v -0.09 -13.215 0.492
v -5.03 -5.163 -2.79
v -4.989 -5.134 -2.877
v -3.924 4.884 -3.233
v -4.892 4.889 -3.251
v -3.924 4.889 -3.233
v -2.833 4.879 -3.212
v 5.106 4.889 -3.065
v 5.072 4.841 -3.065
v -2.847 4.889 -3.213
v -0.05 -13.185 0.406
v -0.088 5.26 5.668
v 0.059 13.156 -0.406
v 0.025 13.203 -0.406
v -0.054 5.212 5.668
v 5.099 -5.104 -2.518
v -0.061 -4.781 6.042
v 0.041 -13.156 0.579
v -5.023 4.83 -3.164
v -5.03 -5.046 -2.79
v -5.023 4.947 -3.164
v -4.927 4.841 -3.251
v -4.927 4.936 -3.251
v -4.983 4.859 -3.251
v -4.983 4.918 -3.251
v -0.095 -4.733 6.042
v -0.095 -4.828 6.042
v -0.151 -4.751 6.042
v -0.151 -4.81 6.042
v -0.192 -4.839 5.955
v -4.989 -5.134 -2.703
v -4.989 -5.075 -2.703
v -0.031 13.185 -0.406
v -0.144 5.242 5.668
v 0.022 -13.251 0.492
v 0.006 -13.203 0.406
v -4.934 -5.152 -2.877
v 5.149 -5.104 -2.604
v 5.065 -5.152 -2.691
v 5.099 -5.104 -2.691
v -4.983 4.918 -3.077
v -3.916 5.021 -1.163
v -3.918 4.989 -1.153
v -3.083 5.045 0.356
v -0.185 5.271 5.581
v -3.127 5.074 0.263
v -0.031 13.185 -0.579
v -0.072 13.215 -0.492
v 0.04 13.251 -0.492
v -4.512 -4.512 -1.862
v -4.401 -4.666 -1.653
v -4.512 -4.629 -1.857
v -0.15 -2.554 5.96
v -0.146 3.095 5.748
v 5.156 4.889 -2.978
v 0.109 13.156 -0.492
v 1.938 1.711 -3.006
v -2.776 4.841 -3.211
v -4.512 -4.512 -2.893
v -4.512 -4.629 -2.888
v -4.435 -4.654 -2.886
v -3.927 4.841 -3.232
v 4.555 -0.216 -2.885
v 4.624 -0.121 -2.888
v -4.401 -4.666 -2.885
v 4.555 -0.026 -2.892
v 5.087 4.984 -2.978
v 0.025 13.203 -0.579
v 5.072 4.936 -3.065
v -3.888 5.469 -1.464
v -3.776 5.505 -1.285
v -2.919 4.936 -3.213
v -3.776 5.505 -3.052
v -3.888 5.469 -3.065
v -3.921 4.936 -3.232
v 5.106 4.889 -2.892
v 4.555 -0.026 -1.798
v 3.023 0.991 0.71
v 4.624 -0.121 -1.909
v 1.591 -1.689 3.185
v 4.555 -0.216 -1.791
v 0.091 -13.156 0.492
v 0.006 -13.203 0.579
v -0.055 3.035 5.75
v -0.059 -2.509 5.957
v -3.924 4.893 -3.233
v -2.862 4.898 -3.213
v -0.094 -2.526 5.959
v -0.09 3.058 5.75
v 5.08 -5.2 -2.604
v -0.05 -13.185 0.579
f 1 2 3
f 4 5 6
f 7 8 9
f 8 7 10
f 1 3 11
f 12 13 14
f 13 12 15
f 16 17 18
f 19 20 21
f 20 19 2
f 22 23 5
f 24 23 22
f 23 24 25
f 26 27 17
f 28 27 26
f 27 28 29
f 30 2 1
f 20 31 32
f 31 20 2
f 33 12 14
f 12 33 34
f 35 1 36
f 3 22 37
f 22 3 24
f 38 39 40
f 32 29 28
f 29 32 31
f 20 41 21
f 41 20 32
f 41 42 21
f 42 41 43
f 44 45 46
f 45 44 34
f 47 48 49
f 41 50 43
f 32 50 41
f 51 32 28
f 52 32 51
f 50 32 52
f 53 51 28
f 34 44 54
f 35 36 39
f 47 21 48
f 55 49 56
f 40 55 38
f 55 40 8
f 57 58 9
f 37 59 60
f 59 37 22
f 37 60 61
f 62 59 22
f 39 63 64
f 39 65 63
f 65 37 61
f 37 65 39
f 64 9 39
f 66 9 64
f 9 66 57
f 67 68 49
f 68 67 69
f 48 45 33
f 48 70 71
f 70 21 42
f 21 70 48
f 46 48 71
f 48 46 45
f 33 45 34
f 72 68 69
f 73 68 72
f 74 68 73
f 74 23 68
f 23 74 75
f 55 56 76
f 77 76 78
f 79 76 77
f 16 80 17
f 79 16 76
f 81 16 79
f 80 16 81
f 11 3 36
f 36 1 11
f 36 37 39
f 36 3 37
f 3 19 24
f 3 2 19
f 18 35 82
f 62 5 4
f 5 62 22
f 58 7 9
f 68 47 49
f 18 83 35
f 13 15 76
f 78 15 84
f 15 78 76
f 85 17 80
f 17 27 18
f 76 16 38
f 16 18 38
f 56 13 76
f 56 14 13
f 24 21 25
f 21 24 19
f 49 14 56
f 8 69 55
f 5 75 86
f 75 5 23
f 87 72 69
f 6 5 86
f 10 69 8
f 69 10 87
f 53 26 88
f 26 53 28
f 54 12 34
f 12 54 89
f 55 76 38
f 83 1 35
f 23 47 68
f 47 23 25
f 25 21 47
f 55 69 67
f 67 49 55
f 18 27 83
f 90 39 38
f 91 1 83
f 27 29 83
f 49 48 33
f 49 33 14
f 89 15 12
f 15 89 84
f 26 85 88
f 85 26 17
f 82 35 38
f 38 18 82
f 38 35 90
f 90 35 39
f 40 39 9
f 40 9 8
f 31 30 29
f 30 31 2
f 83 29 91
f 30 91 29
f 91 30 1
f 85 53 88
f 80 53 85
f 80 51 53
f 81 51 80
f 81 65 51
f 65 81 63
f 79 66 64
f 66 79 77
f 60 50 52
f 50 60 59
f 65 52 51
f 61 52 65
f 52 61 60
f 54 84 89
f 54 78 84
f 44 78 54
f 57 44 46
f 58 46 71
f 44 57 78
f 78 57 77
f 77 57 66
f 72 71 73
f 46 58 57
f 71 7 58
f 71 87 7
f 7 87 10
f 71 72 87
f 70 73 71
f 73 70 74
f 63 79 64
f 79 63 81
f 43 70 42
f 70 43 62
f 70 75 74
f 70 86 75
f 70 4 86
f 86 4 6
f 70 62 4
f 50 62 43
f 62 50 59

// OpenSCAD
// Auto-generated OpenSCAD file

    inner_points = 10*[[-0.4431428263878504, -0.4570616481590885, 0.5000000000000111], [-0.4431428263878677, -0.4570616481591002, -0.49999999999998884], [-0.38067743121914766, 0.5409854821941918, 0.4999999999999984], [-0.3806774312191651, 0.5409854821941802, -0.5000000000000016], [0.452424040256601, -0.012134702055978608, 0.49999999999999045], [0.45242404025658345, -0.012134702055990293, -0.5000000000000095], [-0.12379873911678495, 0.023929710659717798, 1.316496580927726], [-0.12379873911683055, 0.023929710659686996, -1.316496580927726]];

    outer_points = 10*[[-0.49420916328855335, 0.48885165398079056, -0.3164090653808874], [-0.4949038486176348, -0.5104484675685688, -0.27900873805973586], [0.505618378810838, 0.48885165398079056, -0.2978379571886004], [0.5049236934817566, -0.5104484675685688, -0.26043762986744884], [-0.01036718752866248, 0.5212468743624579, 0.5581465315877604], [-0.011061872857743975, -0.4780532471869015, 0.5955468589089121], [0.0009145508605564383, 1.3155751933403925, -0.0492374030438739], [-0.0009145508605564383, -1.3155751933403925, 0.0492374030438739]];

    // Convex hull for inner set (I)
    module inner_hull() {
        hull() {
            for (p = inner_points) {
                translate(p) sphere(r=0.1);
            }
        }
    }

    // Convex hull for outer set (O) minus inner hull (O \ I)
    module outer_minus_inner() {
        difference() {
            hull() {
                for (p = outer_points) {
                    translate(p) sphere(r=0.1);
                }
            }
            inner_hull(); // Subtract inner hull
        }
    }

    // Convex hull for outer set (O) minus all translated inner hulls
    module outer_minus_AllTranslationInner() {
        difference() {
            hull() {
                for (p = outer_points) {
                    translate(p) sphere(r=0.1);
                }
            }
            hull() {
                translate([0,0,50]) inner_hull();
                translate([0,0,-50]) inner_hull();
            }; // Subtract translated inner hulls
        }
    }

    // Difference between outer_minus_inner and outer_minus_AllTranslationInner
    module outer_minus_inner_diff() {
        difference() {
            // Outer minus inner
            difference() {
                hull() {
                    for (p = outer_points) {
                        translate(p) sphere(r=0.1);
                    }
                }
                inner_hull();
            }

            // Subtract Outer minus AllTranslationInner
            difference() {
                hull() {
                    for (p = outer_points) {
                        translate(p) sphere(r=0.1);
                    }
                }
                hull() {
                    translate([0,0,50]) inner_hull();
                    translate([0,0,-50]) inner_hull();
                };
            }
        }
    }

    // Rendering all with colors applied
    color([0, 1, 0, 1]) outer_minus_AllTranslationInner(); // Opaque green
    
